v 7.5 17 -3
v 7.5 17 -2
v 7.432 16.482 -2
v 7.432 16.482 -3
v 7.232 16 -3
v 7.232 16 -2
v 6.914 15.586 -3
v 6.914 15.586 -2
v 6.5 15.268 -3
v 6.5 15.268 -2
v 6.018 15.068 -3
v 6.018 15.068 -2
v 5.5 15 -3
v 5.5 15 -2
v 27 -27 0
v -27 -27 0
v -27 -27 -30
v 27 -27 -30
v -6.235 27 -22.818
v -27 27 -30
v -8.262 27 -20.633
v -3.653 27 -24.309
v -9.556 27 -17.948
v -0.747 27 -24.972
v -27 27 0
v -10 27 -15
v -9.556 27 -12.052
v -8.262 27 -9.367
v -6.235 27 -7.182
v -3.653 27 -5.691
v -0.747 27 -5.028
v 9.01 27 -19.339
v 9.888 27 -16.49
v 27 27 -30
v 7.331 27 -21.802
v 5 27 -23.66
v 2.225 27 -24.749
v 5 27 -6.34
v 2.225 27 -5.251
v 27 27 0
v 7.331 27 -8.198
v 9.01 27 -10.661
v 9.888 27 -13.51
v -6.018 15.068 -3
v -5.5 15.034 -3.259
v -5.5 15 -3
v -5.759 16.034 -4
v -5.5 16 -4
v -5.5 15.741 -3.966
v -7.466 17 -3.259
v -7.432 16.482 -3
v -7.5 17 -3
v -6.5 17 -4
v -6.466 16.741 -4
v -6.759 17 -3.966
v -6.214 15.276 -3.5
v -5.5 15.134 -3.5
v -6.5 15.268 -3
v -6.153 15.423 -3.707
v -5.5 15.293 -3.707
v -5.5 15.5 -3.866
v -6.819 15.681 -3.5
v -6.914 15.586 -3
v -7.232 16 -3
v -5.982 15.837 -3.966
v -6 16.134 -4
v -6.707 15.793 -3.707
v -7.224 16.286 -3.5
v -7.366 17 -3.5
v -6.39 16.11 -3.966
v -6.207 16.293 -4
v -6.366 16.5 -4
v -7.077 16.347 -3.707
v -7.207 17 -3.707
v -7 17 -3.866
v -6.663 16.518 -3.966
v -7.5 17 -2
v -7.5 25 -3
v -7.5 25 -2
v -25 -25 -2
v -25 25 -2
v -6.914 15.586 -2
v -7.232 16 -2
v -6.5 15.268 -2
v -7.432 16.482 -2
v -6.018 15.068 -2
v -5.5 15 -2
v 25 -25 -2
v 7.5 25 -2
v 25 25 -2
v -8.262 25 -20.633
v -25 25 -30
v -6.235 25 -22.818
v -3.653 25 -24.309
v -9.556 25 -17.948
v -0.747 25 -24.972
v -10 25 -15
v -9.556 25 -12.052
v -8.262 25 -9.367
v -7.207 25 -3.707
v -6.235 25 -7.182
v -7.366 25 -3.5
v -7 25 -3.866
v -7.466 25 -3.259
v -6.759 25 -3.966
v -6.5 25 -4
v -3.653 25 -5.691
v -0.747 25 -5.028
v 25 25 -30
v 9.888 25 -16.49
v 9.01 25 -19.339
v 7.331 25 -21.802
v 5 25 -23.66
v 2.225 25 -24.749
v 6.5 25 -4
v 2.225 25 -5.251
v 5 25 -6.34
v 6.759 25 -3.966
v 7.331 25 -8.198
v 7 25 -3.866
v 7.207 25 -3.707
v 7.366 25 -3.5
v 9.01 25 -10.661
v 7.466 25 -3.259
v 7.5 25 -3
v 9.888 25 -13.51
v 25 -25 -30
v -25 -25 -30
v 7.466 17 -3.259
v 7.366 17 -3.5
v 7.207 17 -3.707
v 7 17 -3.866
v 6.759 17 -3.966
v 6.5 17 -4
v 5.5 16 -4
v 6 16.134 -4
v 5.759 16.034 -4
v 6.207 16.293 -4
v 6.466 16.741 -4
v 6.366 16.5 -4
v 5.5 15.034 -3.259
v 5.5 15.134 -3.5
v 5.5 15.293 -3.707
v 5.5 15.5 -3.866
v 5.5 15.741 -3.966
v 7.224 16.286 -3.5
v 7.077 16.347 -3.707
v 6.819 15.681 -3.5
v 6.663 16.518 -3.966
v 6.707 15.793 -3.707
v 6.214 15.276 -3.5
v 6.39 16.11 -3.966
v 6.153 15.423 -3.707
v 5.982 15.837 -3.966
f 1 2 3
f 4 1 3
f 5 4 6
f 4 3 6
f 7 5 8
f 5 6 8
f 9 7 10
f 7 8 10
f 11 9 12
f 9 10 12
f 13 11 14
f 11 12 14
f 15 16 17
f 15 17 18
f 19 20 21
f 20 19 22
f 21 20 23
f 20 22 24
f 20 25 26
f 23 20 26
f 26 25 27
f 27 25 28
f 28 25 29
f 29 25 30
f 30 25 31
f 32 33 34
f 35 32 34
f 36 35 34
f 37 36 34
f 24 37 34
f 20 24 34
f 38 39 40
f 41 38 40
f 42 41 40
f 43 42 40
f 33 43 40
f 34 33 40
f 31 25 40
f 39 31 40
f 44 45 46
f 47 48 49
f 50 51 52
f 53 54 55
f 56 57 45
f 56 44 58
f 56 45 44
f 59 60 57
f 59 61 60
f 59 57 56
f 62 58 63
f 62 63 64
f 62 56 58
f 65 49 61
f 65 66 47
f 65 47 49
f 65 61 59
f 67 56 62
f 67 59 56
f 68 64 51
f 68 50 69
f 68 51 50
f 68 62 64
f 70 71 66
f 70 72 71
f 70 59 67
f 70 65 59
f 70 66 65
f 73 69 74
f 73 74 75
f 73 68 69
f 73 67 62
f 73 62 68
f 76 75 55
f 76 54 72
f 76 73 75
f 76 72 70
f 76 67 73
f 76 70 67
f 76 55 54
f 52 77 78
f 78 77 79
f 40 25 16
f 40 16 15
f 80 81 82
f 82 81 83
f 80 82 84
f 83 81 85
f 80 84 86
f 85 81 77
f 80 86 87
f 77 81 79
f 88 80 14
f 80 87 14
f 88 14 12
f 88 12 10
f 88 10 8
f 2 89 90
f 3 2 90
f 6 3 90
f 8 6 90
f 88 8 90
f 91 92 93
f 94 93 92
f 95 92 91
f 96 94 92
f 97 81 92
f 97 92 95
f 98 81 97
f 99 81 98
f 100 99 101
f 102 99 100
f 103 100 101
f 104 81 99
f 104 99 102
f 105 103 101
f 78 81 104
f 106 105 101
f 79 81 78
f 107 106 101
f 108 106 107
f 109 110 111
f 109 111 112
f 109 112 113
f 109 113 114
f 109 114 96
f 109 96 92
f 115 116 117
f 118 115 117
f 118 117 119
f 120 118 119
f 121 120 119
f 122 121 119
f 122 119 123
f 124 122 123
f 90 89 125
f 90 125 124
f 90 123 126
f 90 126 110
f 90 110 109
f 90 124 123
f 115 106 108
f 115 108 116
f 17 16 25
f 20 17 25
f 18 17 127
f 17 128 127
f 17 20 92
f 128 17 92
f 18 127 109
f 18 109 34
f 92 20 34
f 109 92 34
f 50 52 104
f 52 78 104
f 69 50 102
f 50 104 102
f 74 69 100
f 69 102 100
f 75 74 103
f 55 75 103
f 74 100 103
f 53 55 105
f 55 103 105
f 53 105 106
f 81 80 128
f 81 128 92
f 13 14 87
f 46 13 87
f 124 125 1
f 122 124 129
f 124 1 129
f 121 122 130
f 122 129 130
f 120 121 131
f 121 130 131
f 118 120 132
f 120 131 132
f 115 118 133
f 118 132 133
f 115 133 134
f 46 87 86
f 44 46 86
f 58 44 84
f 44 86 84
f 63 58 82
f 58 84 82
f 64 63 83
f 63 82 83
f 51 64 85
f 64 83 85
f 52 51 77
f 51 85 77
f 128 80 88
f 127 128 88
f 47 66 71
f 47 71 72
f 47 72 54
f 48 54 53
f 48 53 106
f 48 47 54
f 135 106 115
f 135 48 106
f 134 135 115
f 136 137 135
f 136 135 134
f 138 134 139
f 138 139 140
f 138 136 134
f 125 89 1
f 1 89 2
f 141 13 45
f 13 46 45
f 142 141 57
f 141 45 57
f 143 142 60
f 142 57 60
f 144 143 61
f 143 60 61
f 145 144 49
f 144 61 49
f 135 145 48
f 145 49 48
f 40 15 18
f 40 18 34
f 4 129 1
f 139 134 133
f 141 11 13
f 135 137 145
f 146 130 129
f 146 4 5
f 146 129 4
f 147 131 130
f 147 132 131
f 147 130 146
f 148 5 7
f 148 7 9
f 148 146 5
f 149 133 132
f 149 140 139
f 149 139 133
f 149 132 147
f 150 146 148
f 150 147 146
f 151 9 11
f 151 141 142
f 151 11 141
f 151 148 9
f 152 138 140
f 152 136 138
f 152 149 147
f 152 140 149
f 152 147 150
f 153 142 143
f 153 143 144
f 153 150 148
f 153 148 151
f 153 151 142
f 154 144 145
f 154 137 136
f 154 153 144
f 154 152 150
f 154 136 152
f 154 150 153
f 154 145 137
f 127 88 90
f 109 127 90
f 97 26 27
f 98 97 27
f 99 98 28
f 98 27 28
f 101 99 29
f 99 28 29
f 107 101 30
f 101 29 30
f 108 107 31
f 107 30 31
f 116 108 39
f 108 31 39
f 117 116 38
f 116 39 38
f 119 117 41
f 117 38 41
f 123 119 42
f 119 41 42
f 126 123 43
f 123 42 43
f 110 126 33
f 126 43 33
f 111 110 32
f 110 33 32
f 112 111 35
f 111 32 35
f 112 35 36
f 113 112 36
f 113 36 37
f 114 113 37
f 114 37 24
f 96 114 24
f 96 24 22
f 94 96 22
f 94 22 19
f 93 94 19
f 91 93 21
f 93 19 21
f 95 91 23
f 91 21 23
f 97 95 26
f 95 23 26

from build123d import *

# Parameters (mm, degrees)
F0_W     = 54
F0_H     = 54
F0_W_2   = 50
F0_H_2   = 50
F1_DEPTH = 2
F2_DEPTH = 30
F3_R     = 10
F4_DEPTH = 2
F6_DEPTH = 2
F7_R     = 1


with BuildPart() as f1:
    # F0 (on Top) → F1 (new body)
    with BuildSketch(Plane.XY):
        Rectangle(F0_W, F0_H)
        Rectangle(F0_W_2, F0_H_2, mode=Mode.SUBTRACT)
        Rectangle(F0_W_2, F0_H_2)
    extrude(amount=-F1_DEPTH)

    # F0 (on Top) → F2 (join)
    with BuildSketch(Plane.XY):
        Rectangle(F0_W, F0_H)
        Rectangle(F0_W_2, F0_H_2, mode=Mode.SUBTRACT)
    extrude(amount=-F2_DEPTH)

    # F3 (on face) → F4 (cut, through all)
    with BuildSketch(Plane(origin=(0, 27, 0), x_dir=(-1, 0, 0), z_dir=(0, 1, 0))):
        with Locations((0, -15)):
            Circle(F3_R)
    extrude(amount=-F4_DEPTH, mode=Mode.SUBTRACT)

    # F5 (on face) → F6 (join)
    with BuildSketch(Plane(origin=(0, 0, -2), x_dir=(1, 0, 0), z_dir=(0, 0, -1))):
        with BuildLine():
            Line((-7.5, -17), (-7.5, -25))
            Line((-7.5, -25), (7.5, -25))
            Line((7.5, -25), (7.5, -17))
            ThreePointArc((7.5, -17), (6.9142135624, -15.5857864376), (5.5, -15))
            Line((5.5, -15), (-5.5, -15))
            ThreePointArc((-5.5, -15), (-6.9142135624, -15.5857864376), (-7.5, -17))
        make_face()
    extrude(amount=F6_DEPTH)

    # F7
    f7_edges = [f1.edges().sort_by_distance(p)[0] for p in [
        (-7.5, 21, -4),
        (-6.914214, 15.585786, -4),
        (0, 15, -4),
        (6.914214, 15.585786, -4),
        (7.5, 21, -4),
    ]]
    fillet(f7_edges, radius=F7_R)


solid = f1.part
